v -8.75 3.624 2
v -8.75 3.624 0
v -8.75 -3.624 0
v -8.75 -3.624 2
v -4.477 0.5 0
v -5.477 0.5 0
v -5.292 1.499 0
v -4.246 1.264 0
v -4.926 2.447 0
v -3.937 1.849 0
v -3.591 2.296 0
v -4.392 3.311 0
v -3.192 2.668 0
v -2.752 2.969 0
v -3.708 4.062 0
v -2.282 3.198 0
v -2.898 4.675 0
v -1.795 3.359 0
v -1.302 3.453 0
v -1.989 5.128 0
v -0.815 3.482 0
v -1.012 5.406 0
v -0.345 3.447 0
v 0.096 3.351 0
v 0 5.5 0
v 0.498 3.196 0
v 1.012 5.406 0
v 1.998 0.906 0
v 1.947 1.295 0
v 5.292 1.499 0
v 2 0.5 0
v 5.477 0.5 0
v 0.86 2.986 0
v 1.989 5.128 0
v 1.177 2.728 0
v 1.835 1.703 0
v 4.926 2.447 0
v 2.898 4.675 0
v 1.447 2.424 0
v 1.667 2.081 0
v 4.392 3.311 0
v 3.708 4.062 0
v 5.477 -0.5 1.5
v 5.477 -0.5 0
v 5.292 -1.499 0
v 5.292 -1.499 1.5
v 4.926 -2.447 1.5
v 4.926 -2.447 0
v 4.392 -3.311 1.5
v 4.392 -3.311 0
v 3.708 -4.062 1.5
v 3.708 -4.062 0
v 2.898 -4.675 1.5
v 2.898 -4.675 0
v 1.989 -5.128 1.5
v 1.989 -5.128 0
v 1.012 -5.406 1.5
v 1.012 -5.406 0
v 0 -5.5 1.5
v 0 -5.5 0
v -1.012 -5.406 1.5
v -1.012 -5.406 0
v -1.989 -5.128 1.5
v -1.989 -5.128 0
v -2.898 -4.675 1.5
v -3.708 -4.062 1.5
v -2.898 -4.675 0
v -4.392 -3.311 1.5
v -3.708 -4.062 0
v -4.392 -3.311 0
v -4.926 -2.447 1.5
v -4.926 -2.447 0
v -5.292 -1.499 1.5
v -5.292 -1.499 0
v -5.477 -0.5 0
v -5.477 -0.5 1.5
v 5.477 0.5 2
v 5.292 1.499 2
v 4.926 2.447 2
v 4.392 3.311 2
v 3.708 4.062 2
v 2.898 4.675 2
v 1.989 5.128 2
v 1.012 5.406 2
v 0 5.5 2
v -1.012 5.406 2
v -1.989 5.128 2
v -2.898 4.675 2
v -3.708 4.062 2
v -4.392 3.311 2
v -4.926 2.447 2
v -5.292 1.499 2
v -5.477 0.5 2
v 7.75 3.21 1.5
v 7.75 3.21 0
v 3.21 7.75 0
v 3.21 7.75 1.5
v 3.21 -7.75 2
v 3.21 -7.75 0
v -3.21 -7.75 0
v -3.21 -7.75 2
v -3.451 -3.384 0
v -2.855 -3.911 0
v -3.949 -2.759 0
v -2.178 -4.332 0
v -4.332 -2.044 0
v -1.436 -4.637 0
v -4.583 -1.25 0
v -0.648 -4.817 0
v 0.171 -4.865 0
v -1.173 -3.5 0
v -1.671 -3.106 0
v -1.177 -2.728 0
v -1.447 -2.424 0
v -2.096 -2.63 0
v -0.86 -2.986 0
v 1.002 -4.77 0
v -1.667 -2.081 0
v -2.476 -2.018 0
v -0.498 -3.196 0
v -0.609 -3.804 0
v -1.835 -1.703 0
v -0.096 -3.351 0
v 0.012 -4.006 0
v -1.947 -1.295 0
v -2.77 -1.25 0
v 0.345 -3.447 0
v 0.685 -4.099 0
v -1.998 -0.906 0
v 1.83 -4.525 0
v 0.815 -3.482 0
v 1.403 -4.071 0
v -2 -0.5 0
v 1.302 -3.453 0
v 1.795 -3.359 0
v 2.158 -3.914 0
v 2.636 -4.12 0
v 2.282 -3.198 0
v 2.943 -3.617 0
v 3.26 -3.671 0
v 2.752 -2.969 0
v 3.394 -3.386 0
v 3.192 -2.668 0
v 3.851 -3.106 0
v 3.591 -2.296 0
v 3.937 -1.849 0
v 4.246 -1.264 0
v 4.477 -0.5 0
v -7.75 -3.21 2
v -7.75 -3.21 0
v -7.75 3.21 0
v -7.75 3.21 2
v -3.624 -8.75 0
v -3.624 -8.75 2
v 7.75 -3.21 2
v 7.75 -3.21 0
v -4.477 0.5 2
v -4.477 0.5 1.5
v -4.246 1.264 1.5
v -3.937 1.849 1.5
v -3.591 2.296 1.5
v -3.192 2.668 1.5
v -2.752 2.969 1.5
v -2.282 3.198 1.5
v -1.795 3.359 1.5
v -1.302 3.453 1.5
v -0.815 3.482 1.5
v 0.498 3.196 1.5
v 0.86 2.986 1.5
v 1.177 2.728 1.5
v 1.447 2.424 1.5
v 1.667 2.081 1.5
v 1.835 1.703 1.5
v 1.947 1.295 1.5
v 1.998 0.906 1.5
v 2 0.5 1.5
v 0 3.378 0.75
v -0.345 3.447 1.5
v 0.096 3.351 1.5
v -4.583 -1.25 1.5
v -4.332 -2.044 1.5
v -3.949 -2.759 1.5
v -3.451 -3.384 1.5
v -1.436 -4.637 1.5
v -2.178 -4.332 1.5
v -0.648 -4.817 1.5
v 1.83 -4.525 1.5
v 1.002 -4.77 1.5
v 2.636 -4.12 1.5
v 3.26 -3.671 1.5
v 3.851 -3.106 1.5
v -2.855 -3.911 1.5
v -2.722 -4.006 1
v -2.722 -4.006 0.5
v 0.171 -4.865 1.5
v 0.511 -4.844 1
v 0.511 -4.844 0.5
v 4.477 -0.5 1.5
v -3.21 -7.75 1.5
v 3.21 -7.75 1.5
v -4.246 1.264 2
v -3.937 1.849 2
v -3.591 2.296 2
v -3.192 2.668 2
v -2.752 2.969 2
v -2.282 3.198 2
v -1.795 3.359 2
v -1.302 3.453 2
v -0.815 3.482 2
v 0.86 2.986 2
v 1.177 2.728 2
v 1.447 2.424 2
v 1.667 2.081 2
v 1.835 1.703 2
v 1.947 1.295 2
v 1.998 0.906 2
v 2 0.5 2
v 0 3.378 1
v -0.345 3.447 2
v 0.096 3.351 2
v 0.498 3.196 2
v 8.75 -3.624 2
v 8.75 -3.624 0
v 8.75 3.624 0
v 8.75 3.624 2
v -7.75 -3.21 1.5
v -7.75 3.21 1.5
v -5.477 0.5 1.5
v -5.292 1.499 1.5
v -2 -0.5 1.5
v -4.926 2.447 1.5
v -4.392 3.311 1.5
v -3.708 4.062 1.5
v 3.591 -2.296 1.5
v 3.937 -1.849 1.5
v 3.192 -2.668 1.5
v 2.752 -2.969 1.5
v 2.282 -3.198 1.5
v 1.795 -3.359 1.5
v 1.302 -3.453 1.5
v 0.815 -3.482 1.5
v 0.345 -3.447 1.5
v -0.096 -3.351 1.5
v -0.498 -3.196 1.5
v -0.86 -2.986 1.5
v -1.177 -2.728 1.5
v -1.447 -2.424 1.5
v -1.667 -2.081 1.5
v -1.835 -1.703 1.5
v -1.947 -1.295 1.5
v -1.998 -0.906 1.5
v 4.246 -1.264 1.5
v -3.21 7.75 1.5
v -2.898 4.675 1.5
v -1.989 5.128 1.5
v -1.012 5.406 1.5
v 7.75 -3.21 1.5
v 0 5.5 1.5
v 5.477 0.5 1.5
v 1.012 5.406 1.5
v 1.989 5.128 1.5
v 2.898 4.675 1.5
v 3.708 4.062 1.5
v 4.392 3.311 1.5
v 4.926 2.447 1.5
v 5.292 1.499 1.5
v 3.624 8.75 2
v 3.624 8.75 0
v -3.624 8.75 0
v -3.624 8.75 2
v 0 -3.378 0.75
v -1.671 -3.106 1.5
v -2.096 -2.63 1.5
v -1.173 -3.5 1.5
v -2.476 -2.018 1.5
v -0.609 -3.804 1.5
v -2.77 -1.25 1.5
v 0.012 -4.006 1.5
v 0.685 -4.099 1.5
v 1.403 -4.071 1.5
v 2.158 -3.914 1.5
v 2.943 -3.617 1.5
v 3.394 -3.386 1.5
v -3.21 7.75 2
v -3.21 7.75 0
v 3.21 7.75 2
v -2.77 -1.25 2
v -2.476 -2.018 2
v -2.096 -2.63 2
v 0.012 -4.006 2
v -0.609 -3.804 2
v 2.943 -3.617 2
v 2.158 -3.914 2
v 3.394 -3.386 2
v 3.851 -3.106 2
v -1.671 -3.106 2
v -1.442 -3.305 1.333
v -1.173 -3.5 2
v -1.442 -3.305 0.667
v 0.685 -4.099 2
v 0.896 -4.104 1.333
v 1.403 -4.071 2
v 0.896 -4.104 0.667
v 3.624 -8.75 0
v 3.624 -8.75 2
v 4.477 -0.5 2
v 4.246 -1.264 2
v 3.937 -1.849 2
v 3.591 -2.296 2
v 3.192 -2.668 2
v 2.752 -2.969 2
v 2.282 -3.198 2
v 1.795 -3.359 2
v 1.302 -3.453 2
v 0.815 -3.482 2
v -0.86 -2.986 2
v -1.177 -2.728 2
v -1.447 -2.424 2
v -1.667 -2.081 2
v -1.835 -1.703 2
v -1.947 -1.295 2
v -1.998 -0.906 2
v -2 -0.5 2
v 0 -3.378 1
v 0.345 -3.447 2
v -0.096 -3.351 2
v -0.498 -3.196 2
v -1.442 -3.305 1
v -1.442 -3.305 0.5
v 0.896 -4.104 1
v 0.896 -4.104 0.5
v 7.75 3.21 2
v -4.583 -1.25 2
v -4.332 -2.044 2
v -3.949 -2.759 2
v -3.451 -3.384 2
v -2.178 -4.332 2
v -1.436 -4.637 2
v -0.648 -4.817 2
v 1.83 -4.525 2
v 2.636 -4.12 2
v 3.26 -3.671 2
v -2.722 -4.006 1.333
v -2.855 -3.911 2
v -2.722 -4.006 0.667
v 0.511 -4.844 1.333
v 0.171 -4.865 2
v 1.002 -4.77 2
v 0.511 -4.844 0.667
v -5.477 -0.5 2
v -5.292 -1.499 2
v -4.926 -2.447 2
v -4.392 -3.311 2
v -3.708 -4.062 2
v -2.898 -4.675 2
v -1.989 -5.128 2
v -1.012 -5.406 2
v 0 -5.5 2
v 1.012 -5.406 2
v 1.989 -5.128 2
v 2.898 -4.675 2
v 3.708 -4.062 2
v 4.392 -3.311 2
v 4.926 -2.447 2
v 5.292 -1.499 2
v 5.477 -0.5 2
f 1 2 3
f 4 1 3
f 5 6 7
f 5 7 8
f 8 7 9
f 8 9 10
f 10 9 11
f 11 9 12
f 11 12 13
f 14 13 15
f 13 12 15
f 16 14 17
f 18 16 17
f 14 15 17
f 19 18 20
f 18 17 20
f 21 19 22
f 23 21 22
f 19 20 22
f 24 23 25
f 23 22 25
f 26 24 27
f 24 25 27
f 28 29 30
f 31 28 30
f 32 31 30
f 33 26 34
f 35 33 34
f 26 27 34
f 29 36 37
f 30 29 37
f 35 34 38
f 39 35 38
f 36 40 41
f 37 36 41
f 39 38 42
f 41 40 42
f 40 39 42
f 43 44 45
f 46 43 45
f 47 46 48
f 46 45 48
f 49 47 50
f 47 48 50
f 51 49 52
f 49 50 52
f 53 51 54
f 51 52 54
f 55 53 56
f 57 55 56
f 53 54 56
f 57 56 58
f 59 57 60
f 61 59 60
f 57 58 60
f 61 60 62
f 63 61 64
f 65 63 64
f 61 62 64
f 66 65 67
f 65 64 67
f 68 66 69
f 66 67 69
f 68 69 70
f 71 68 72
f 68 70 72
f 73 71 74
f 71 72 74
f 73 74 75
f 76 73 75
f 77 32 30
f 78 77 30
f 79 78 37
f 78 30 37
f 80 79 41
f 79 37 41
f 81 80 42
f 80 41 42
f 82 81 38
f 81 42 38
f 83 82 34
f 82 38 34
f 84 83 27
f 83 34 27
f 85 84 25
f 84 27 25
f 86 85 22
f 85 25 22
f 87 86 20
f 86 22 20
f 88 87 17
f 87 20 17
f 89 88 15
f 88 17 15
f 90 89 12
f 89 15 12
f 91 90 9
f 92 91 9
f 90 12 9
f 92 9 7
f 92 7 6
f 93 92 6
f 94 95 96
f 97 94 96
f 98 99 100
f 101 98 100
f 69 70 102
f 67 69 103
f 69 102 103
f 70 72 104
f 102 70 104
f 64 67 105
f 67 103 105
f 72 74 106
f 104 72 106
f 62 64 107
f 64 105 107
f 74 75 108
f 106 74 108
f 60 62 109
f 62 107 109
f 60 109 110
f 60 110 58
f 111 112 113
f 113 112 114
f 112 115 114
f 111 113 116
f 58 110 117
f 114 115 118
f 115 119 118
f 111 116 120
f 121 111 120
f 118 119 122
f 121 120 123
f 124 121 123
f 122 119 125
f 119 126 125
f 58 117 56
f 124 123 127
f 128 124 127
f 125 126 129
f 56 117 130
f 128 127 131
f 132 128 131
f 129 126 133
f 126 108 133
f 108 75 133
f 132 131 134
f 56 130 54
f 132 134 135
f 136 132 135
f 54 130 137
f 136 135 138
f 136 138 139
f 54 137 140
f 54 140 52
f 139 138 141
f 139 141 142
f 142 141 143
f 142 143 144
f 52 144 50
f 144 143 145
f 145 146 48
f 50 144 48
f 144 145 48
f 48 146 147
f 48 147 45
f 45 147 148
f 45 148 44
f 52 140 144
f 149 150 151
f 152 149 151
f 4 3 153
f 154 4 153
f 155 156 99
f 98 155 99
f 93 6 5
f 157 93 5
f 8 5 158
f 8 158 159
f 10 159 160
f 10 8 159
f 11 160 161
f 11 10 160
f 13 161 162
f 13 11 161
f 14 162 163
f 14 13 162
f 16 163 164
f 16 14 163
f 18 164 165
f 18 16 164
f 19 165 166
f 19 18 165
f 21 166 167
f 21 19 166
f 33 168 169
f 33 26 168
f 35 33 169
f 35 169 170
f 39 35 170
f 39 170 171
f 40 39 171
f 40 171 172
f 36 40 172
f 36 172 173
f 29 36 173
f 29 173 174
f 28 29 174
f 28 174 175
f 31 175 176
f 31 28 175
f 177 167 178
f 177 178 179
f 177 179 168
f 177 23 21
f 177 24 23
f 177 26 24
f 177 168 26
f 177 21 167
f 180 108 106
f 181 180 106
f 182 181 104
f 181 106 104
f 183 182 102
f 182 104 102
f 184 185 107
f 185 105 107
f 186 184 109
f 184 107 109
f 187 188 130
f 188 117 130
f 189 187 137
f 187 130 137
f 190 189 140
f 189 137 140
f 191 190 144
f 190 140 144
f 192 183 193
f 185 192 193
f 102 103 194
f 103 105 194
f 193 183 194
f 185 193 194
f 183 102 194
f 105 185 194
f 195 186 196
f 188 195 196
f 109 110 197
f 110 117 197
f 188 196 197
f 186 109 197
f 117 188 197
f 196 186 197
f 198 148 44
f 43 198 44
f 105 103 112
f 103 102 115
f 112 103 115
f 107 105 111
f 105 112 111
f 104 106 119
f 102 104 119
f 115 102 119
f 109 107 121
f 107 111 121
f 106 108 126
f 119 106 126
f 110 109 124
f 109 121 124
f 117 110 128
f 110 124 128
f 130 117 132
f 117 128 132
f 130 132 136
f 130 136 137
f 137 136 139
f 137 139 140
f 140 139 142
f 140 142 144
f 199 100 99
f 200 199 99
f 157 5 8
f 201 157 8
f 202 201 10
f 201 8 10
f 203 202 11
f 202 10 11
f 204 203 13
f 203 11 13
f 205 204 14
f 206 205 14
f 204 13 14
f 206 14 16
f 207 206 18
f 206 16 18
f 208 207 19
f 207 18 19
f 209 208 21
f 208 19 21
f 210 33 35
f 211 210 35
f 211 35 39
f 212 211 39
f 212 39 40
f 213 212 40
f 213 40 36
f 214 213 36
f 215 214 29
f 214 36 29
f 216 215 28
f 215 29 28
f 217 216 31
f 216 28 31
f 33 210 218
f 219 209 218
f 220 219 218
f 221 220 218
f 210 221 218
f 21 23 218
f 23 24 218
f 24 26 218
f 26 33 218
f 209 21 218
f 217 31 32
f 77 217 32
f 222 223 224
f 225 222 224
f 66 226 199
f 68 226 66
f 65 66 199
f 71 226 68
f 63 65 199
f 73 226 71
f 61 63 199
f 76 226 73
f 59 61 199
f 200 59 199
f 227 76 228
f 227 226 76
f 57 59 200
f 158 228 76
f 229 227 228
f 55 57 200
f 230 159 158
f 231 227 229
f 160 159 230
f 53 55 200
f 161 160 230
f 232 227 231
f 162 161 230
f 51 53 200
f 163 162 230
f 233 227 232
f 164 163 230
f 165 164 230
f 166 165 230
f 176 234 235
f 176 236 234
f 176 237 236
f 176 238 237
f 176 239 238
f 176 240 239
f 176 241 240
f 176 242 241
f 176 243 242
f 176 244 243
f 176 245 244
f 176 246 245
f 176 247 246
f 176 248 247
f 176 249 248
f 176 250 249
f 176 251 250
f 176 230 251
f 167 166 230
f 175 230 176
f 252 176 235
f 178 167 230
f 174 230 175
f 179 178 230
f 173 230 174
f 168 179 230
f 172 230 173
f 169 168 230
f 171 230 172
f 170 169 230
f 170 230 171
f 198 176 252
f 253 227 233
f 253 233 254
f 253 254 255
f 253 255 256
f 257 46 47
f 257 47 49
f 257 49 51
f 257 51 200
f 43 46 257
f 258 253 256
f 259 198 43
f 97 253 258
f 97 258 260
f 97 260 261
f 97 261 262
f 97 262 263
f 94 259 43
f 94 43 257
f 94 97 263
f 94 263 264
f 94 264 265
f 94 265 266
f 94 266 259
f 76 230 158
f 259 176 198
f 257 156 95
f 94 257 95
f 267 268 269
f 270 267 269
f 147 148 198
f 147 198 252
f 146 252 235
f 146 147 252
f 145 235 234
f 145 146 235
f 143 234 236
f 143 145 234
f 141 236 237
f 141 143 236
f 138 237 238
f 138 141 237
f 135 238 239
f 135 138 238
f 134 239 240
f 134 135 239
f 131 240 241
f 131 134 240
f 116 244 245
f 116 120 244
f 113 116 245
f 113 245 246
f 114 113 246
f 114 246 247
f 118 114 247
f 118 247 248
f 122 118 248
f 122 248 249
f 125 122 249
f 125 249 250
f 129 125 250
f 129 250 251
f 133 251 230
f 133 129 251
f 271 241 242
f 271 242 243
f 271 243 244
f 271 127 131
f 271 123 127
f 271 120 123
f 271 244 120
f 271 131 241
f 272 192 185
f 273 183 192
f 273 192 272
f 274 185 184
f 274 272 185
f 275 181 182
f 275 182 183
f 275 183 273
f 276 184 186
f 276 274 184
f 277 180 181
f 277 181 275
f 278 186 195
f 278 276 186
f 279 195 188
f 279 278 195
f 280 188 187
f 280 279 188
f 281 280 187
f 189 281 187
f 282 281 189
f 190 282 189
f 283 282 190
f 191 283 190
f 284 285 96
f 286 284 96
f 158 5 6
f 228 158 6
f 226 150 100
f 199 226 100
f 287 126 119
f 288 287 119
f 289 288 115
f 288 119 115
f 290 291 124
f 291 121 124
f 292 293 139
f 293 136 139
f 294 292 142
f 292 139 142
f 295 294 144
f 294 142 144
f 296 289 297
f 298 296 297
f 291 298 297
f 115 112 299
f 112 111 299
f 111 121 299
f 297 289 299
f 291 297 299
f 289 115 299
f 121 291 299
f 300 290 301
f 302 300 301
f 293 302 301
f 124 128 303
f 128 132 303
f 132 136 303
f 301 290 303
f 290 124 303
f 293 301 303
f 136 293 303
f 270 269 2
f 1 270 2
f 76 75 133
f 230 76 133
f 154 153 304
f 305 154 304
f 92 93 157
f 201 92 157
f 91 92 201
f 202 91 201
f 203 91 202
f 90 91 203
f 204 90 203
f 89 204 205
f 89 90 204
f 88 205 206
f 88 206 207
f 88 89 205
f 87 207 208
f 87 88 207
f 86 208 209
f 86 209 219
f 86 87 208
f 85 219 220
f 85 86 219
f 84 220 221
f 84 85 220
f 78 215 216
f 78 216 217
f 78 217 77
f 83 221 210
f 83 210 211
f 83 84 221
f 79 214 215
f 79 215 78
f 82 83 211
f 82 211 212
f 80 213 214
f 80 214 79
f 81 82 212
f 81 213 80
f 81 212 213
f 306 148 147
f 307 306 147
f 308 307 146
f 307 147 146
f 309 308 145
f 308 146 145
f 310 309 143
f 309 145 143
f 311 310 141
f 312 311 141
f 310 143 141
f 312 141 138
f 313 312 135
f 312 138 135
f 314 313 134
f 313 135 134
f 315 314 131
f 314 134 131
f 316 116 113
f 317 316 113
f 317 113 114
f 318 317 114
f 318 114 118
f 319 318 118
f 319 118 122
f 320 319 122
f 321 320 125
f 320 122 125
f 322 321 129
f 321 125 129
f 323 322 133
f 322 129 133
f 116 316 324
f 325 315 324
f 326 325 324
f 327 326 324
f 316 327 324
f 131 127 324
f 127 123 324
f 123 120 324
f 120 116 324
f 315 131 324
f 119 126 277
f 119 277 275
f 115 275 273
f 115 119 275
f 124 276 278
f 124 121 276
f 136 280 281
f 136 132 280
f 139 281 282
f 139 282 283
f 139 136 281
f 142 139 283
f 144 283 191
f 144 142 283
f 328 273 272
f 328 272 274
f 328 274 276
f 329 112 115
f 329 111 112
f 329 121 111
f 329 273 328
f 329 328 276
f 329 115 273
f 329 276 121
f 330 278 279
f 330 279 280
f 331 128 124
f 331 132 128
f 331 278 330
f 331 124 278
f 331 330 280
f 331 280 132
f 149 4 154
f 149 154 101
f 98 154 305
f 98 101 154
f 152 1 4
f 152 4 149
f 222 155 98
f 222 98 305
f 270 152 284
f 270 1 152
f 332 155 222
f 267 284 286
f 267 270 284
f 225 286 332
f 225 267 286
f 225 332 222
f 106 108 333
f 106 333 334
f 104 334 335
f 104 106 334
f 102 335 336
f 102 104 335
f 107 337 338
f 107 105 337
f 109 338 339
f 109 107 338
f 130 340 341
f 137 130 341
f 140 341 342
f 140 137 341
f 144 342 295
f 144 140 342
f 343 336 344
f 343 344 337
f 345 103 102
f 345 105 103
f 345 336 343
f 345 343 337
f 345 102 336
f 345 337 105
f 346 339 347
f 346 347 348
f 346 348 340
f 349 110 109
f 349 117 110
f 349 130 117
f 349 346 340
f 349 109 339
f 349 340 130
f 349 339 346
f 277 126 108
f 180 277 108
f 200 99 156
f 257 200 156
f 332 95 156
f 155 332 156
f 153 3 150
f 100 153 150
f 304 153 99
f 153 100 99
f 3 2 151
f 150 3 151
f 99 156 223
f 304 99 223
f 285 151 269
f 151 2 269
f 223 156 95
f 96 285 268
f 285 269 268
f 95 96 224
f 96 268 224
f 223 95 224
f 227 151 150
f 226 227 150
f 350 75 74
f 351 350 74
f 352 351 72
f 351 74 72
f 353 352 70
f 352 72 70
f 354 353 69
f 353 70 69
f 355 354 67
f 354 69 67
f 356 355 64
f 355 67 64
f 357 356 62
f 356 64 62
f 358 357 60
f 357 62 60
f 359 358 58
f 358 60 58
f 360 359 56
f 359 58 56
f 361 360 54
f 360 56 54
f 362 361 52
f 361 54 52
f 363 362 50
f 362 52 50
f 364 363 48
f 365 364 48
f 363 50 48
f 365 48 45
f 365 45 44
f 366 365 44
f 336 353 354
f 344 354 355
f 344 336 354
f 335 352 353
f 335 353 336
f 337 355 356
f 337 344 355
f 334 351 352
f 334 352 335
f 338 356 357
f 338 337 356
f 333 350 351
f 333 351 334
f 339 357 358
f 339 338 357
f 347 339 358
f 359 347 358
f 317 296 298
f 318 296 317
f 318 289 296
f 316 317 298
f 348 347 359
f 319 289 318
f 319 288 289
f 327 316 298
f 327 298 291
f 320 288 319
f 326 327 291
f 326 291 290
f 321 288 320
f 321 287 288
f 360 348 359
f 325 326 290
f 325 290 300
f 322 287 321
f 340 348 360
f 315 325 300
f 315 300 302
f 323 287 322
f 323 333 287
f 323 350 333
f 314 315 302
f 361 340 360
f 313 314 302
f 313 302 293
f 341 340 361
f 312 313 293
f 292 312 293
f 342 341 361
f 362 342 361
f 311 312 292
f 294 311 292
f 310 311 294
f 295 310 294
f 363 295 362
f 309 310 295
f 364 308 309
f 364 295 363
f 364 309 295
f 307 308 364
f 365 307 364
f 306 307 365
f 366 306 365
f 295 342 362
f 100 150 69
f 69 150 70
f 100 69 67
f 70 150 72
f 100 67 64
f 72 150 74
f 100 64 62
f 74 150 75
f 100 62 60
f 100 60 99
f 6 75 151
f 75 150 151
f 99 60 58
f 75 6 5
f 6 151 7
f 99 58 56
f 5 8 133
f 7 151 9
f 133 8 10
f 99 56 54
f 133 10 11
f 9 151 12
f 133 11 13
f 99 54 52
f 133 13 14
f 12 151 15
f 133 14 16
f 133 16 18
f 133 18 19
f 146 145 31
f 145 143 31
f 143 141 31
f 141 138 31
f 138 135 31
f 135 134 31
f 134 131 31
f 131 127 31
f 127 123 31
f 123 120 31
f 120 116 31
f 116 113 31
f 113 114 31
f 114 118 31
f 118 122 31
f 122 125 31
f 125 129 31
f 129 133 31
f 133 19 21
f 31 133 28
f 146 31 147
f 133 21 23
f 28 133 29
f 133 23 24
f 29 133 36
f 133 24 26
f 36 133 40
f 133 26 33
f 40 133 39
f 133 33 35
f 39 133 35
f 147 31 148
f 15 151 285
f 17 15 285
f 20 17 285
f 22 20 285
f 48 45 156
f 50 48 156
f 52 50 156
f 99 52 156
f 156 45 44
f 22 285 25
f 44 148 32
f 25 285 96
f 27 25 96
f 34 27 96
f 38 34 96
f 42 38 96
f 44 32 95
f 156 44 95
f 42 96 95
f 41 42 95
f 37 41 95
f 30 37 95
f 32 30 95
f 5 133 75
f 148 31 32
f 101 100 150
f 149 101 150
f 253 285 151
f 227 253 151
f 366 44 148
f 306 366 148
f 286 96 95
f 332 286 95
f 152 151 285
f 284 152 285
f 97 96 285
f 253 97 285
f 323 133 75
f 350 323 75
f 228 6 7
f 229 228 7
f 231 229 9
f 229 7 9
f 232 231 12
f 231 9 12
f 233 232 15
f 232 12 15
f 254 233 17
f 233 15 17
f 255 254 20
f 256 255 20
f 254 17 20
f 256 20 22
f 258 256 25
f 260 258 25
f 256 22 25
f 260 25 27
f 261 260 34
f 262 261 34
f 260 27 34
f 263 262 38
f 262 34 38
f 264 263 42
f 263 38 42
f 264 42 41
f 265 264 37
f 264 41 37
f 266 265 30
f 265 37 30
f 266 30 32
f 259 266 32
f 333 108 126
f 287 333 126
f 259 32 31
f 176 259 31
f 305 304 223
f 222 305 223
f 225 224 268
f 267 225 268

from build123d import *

# Parameters (mm, degrees)
F1_DEPTH = 2
F2_DEPTH = 1.5


# Not quite as in the source:
# - a feature names something its author has since deleted; it is built from what else it names


with BuildPart() as f1:
    # F0 (on Top) → F1 (new body)
    with BuildSketch(Plane.XY):
        with BuildLine():
            ThreePointArc((5.4772255751, 0.5), (0, 5.5), (-5.4772255751, 0.5))
            Line((-5.4772255751, 0.5), (-4.4772255751, 0.5))
            add(Edge.make_bspline(
                [(-4.4772255751, 0.5), (-3.9824196137, 2.9745399952), (0.3355675447, 4.4637305093), (2.0776381716, 1.8807736924), (2, 0.5)],
                knots=[0, 0, 0, 0, 0.5520438293, 1, 1, 1, 1], degree=3))
            Line((2, 0.5), (5.4772255751, 0.5))
        make_face()
    extrude(amount=F1_DEPTH)


with BuildPart() as f1b:
    # F0 (on Top) → F1, piece 2 (new body)
    with BuildSketch(Plane.XY):
        with BuildLine():
            Line((-2, -0.5), (-5.4772255751, -0.5))
            ThreePointArc((-5.4772255751, -0.5), (0, -5.5), (5.4772255751, -0.5))
            Line((5.4772255751, -0.5), (4.4772255751, -0.5))
            add(Edge.make_bspline(
                [(4.4772255751, -0.5), (3.9824196137, -2.9745399952), (-0.3355675447, -4.4637305093), (-2.0776381716, -1.8807736924), (-2, -0.5)],
                knots=[0, 0, 0, 0, 0.5520438293, 1, 1, 1, 1], degree=3))
        make_face()
        with BuildLine():
            add(Edge.make_bspline(
                [(-4.582575695, -1.25), (-3.830221016, -4.746818915), (0.8803614764, -6.3501568511), (3.8508872967, -3.1061938498)],
                knots=[0, 0, 0, 0, 8.6353201238, 8.6353201238, 8.6353201238, 8.6353201238], degree=3))
            Line((-4.582575695, -1.25), (-2.770407591, -1.25))
            add(Edge.make_bspline(
                [(-2.770407591, -1.25), (-2.077735262, -3.7525005173), (0.7187846932, -5.1818331704), (3.8508872967, -3.1061938498)],
                knots=[0, 0, 0, 0, 6.876554486, 6.876554486, 6.876554486, 6.876554486], degree=3))
        make_face(mode=Mode.SUBTRACT)
    extrude(amount=F1_DEPTH)


with BuildPart() as f1c:
    # F0 (on Top) → F1, piece 3 (new body)
    with BuildSketch(Plane.XY):
        Polygon((3.6243686708, -8.75), (8.75, -3.6243686708), (8.75, 3.6243686708), (3.6243686708, 8.75), (-3.6243686708, 8.75), (-8.75, 3.6243686708), (-8.75, -3.6243686708), (-3.6243686708, -8.75), align=None)
        Polygon((7.75, 3.2101551084), (7.75, -3.2101551084), (3.2101551084, -7.75), (-3.2101551084, -7.75), (-7.75, -3.2101551084), (-7.75, 3.2101551084), (-3.2101551084, 7.75), (3.2101551084, 7.75), align=None, mode=Mode.SUBTRACT)
    extrude(amount=F1_DEPTH)


with BuildPart() as f2:
    # F0 (on Top) → F2 (new body)
    with BuildSketch(Plane.XY):
        with BuildLine():
            Line((-2.770407591, -1.25), (-4.582575695, -1.25))
            add(Edge.make_bspline(
                [(-4.582575695, -1.25), (-3.830221016, -4.746818915), (0.8803614764, -6.3501568511), (3.8508872967, -3.1061938498)],
                knots=[0, 0, 0, 0, 8.6353201238, 8.6353201238, 8.6353201238, 8.6353201238], degree=3))
            add(Edge.make_bspline(
                [(-2.770407591, -1.25), (-2.077735262, -3.7525005173), (0.7187846932, -5.1818331704), (3.8508872967, -3.1061938498)],
                knots=[0, 0, 0, 0, 6.876554486, 6.876554486, 6.876554486, 6.876554486], degree=3))
        make_face()
    extrude(amount=F2_DEPTH)


with BuildPart() as f2b:
    # F0 (on Top) → F2, piece 2 (new body)
    with BuildSketch(Plane.XY):
        Polygon((3.2101551084, -7.75), (7.75, -3.2101551084), (7.75, 3.2101551084), (3.2101551084, 7.75), (-3.2101551084, 7.75), (-7.75, 3.2101551084), (-7.75, -3.2101551084), (-3.2101551084, -7.75), align=None)
        with BuildLine():
            ThreePointArc((5.4772255751, -0.5), (0, -5.5), (-5.4772255751, -0.5))
            Line((-5.4772255751, -0.5), (-2, -0.5))
            add(Edge.make_bspline(
                [(4.4772255751, -0.5), (3.9824196137, -2.9745399952), (-0.3355675447, -4.4637305093), (-2.0776381716, -1.8807736924), (-2, -0.5)],
                knots=[0, 0, 0, 0, 0.5520438293, 1, 1, 1, 1], degree=3))
            Line((4.4772255751, -0.5), (5.4772255751, -0.5))
        make_face(mode=Mode.SUBTRACT)
        with BuildLine():
            Line((-4.4772255751, 0.5), (-5.4772255751, 0.5))
            ThreePointArc((-5.4772255751, 0.5), (0, 5.5), (5.4772255751, 0.5))
            Line((5.4772255751, 0.5), (2, 0.5))
            add(Edge.make_bspline(
                [(-4.4772255751, 0.5), (-3.9824196137, 2.9745399952), (0.3355675447, 4.4637305093), (2.0776381716, 1.8807736924), (2, 0.5)],
                knots=[0, 0, 0, 0, 0.5520438293, 1, 1, 1, 1], degree=3))
        make_face(mode=Mode.SUBTRACT)
    extrude(amount=F2_DEPTH)


solid = Compound([f1.part, f1b.part, f1c.part, f2.part, f2b.part])
